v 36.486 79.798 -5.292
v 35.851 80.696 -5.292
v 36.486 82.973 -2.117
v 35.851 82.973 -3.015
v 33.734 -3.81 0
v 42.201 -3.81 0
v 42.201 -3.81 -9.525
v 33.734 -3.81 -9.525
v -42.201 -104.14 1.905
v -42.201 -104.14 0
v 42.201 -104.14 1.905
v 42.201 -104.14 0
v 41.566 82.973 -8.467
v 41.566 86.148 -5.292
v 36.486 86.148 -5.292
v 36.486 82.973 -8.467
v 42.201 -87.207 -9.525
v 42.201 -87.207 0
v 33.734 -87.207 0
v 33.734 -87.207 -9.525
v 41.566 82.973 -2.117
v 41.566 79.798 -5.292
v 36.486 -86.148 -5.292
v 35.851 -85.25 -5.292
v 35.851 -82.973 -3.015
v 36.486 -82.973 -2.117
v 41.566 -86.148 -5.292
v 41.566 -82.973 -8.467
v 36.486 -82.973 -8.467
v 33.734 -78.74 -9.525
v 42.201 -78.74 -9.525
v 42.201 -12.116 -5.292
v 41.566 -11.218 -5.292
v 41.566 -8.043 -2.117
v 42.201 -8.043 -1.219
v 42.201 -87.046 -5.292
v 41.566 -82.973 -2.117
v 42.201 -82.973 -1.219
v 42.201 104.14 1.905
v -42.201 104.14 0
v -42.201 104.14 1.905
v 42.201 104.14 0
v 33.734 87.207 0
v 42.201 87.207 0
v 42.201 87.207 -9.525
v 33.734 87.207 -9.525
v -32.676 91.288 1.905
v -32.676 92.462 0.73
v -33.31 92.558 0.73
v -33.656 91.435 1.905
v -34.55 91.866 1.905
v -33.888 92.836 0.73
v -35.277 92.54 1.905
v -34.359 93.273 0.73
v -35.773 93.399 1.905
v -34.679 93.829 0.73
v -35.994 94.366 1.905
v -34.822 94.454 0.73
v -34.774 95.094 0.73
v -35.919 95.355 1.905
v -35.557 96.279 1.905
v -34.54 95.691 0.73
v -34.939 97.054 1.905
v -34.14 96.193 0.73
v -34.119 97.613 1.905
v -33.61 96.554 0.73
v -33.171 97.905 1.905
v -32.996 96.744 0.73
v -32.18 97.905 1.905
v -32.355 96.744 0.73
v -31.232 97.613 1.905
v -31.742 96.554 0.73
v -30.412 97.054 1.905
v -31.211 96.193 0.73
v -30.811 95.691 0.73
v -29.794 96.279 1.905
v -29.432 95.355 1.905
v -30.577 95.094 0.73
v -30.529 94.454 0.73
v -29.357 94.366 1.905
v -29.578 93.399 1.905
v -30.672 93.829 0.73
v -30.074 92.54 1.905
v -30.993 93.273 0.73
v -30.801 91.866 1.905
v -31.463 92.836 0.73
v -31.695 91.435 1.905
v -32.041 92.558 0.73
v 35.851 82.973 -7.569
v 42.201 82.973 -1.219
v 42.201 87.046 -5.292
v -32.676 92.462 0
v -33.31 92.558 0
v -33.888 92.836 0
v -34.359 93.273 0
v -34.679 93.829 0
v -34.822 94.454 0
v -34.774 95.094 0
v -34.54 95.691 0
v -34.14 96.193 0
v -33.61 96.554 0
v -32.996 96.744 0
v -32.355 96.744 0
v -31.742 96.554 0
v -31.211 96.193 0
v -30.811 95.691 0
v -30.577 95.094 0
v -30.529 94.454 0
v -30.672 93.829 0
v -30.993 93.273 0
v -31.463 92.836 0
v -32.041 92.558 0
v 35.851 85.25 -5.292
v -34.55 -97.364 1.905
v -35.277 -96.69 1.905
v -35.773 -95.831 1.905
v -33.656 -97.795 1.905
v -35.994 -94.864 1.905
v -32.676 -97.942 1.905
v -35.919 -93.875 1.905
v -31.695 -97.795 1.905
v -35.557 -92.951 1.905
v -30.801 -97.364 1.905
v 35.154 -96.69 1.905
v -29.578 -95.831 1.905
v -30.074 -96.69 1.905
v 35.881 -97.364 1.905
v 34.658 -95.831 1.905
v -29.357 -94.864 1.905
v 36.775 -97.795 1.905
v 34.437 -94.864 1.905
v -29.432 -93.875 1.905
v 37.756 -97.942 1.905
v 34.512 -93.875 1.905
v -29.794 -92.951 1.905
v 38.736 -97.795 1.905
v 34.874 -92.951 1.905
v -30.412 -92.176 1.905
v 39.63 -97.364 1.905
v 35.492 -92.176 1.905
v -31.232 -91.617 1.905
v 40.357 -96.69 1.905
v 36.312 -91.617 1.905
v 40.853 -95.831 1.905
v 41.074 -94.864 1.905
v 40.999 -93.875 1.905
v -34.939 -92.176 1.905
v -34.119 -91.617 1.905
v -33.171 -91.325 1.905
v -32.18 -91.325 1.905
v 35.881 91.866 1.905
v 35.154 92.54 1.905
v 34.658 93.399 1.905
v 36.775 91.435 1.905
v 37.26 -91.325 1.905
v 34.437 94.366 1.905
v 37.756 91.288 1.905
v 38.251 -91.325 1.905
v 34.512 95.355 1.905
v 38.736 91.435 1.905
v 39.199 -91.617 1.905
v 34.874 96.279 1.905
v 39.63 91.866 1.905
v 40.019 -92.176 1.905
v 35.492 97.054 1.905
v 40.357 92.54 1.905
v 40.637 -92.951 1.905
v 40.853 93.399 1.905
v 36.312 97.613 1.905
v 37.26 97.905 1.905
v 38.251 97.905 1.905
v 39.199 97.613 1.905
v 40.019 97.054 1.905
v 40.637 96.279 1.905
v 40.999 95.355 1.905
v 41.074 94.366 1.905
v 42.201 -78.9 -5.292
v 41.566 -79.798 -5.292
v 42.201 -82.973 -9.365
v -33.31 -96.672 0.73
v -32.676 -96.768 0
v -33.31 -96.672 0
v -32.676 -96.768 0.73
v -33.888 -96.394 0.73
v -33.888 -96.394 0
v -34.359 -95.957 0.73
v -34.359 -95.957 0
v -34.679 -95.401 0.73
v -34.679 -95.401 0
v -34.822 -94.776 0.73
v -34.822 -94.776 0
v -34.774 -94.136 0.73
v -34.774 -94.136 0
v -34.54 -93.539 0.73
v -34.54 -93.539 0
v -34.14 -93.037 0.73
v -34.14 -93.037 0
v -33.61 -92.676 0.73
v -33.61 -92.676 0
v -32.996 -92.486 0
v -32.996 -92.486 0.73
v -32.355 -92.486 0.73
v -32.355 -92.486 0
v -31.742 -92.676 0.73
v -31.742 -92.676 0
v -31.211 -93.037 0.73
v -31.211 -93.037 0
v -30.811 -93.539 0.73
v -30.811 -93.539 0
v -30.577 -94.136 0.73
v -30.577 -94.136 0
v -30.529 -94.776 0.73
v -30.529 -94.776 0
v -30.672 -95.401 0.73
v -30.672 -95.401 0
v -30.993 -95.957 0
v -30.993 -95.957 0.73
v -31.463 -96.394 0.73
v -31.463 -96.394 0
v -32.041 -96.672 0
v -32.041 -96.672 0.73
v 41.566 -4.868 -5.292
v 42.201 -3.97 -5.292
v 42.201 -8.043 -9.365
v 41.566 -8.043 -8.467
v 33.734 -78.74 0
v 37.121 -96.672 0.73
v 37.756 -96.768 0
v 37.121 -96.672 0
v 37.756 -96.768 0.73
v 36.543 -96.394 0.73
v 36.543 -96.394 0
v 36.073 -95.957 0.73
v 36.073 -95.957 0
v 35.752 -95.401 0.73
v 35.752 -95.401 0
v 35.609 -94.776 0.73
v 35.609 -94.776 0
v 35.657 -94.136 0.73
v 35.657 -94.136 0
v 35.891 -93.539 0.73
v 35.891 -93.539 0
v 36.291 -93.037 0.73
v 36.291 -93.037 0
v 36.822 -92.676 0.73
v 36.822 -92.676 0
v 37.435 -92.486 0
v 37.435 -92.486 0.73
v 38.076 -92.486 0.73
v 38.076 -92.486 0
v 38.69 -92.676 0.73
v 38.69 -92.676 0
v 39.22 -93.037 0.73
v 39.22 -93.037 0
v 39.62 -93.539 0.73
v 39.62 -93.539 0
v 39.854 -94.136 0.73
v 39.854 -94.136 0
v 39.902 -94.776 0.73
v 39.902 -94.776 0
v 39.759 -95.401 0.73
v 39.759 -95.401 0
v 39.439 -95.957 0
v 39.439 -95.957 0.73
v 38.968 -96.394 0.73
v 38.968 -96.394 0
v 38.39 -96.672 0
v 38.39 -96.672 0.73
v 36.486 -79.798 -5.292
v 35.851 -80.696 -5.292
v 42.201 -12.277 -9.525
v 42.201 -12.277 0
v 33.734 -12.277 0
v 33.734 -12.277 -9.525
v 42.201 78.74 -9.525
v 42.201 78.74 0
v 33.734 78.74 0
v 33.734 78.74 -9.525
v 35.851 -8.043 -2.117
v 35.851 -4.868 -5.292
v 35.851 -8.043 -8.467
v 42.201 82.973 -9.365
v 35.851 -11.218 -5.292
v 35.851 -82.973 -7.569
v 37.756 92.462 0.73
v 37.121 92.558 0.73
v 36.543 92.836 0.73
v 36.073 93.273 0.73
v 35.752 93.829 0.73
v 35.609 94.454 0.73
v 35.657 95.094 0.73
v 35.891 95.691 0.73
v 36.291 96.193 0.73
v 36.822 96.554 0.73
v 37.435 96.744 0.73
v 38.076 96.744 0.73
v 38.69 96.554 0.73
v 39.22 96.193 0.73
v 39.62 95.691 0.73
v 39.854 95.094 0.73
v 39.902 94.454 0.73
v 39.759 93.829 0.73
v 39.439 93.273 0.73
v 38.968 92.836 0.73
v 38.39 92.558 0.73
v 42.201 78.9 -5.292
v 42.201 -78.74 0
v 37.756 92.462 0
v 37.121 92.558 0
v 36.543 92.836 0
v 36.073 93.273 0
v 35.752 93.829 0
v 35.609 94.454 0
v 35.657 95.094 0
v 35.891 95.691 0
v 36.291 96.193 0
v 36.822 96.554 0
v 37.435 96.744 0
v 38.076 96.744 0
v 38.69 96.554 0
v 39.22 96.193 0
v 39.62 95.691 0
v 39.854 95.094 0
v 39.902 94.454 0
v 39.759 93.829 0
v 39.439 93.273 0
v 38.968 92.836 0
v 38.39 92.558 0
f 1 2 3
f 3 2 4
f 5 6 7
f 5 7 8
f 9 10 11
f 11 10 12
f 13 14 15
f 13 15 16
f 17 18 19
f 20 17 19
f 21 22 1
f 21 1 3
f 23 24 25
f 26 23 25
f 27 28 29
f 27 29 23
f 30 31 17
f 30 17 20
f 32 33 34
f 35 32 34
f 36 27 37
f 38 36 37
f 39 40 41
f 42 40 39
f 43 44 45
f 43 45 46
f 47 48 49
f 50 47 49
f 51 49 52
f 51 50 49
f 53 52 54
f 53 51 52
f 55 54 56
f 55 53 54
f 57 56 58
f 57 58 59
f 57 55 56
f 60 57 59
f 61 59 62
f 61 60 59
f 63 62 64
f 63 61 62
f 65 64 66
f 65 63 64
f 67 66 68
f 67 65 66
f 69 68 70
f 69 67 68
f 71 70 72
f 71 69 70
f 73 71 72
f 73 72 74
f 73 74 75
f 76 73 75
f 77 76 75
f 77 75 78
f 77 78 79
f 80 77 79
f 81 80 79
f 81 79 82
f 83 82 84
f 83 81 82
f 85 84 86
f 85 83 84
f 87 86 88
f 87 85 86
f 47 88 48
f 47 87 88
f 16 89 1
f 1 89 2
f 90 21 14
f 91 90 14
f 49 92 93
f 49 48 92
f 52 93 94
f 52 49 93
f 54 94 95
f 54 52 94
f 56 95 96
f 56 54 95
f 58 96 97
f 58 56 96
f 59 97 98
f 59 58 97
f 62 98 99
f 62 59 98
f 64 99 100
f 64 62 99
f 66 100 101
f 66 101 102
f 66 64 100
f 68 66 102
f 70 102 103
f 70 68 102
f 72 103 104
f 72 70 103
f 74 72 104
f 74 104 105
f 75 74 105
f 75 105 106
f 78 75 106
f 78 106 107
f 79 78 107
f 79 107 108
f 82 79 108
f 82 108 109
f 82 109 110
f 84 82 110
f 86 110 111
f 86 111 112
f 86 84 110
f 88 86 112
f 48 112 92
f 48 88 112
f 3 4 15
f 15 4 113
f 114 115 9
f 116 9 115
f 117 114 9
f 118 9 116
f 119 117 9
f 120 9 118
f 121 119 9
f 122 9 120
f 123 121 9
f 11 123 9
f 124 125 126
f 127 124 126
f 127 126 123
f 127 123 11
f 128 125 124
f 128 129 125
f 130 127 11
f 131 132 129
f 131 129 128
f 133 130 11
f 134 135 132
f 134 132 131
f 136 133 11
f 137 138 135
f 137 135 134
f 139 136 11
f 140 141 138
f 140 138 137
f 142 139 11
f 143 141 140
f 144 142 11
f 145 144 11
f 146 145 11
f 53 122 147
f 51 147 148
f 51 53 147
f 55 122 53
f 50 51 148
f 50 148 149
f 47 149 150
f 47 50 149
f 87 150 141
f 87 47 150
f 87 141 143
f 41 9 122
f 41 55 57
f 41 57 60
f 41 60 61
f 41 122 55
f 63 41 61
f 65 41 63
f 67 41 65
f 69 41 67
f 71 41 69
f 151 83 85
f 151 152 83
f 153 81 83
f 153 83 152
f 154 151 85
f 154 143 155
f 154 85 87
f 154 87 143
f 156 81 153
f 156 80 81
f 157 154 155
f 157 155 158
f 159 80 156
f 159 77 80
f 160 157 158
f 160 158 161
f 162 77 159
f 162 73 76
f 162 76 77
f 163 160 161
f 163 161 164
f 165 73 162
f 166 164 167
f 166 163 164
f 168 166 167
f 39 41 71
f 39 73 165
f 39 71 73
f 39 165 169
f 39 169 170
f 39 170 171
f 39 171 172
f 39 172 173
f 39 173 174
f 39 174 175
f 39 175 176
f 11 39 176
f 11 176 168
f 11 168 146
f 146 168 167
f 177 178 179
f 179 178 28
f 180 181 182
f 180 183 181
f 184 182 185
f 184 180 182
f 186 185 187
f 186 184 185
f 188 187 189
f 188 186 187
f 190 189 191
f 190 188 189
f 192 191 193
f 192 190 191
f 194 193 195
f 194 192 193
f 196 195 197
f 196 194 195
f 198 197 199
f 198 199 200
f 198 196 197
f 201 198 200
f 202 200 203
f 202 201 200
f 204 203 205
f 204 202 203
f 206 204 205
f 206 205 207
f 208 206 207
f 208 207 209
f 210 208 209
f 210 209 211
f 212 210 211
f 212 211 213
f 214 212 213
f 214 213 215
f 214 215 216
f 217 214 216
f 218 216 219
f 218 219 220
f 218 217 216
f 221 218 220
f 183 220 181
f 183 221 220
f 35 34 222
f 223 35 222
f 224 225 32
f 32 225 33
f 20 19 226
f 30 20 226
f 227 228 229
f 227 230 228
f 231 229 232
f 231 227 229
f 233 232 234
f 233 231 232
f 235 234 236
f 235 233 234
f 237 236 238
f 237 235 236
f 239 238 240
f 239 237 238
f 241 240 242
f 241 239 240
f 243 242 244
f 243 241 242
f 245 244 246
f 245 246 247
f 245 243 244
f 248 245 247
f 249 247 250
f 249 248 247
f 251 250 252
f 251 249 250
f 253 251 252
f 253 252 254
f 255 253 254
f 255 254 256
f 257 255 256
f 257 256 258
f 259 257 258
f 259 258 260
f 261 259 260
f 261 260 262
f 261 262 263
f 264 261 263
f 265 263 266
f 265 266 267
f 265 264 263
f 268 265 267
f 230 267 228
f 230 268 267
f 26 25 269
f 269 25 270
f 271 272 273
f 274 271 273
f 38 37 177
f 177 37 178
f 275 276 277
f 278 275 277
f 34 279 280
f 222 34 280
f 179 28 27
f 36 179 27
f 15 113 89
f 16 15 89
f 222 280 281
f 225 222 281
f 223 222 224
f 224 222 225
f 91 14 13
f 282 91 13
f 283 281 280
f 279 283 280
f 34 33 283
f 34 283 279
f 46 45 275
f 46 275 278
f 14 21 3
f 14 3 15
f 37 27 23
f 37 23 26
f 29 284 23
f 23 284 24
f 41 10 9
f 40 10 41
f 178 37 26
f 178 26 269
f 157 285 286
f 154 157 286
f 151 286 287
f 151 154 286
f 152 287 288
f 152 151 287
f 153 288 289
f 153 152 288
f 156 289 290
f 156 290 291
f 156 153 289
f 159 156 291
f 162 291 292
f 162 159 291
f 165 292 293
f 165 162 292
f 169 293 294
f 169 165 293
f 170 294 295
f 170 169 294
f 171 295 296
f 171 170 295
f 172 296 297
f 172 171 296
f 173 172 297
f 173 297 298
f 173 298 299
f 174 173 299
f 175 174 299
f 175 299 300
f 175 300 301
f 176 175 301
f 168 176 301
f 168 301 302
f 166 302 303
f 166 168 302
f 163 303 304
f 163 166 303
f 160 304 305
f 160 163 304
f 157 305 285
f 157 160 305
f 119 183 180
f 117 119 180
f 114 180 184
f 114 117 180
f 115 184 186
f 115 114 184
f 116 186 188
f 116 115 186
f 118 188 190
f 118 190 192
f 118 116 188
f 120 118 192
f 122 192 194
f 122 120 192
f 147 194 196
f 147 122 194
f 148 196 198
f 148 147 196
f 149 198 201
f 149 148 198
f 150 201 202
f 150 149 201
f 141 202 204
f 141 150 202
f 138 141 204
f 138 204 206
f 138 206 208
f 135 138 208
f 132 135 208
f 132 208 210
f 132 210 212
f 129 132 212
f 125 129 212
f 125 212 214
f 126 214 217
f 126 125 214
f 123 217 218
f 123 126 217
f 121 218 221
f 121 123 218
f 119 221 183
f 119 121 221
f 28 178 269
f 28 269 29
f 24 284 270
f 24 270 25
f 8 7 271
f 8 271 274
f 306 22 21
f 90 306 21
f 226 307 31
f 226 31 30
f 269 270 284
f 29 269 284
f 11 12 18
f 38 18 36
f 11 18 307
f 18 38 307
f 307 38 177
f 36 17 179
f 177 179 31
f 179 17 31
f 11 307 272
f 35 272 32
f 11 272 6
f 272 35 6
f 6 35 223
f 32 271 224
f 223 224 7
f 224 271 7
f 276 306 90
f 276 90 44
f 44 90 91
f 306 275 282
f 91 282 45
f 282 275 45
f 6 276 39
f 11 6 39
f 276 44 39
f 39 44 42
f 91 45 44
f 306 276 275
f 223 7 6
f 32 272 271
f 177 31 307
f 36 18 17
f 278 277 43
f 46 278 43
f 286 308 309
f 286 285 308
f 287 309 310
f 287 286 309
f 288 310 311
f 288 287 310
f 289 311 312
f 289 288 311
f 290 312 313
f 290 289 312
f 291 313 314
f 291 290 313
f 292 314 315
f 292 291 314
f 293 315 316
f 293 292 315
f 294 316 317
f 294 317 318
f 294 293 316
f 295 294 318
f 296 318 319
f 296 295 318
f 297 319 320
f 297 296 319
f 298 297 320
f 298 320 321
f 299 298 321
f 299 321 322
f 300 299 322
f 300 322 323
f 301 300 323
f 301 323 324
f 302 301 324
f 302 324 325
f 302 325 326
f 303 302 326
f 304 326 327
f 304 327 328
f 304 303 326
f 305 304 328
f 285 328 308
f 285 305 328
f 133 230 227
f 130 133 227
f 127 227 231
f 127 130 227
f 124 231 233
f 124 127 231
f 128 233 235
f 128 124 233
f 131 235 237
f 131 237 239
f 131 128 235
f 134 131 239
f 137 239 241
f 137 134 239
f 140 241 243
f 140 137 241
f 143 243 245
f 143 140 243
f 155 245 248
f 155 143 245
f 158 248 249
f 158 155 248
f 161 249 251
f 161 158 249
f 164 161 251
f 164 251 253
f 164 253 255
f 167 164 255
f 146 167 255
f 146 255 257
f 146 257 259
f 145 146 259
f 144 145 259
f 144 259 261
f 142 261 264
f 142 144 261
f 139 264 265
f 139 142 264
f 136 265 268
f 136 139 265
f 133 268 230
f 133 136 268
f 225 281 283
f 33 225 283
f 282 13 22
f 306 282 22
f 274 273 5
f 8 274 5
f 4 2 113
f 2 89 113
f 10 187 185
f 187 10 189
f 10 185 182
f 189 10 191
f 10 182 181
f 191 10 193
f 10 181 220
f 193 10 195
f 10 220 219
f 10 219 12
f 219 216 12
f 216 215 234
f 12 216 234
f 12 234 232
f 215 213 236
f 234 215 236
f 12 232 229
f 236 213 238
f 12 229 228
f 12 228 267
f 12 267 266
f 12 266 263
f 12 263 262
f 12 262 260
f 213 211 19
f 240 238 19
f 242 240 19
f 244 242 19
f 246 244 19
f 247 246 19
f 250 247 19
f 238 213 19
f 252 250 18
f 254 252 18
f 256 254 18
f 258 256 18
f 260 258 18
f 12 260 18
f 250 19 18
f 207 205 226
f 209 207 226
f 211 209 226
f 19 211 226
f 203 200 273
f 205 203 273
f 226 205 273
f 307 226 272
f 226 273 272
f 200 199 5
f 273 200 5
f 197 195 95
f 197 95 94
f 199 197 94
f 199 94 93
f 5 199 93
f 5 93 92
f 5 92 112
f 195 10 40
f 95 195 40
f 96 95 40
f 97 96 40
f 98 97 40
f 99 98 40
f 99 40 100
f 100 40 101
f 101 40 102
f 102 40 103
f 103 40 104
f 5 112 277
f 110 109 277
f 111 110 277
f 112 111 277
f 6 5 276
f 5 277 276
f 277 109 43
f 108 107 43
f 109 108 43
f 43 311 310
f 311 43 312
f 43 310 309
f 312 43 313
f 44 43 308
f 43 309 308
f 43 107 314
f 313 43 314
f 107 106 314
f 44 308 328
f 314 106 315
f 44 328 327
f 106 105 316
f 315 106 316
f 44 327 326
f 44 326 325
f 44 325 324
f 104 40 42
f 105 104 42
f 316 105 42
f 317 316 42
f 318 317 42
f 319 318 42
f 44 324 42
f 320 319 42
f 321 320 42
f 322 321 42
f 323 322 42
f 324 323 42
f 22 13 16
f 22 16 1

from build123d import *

# Parameters (mm, degrees)
SKETCH1_W                      = 84.401025
SKETCH1_H                      = 208.28
BOSS_EXTRUDE1_DEPTH            = 1.905
F_6_CLEARANCE_HOLE1_AT_2_COUNT = 2
F_6_CLEARANCE_HOLE1_AT_2_PITCH = 189.23
F_6_CLEARANCE_HOLE1_AT_3_COUNT = 2
F_6_CLEARANCE_HOLE1_AT_3_PITCH = 201.912164523
F_6_CLEARANCE_HOLE1_AT_4_COUNT = 2
F_6_CLEARANCE_HOLE1_AT_4_PITCH = 70.431025
SKETCH4_W                      = 8.466667
SKETCH4_H                      = 8.466667
BOSS_EXTRUDE2_DEPTH            = 9.525
CUT_EXTRUDE3_DEPTH             = 6.35
CHAMFER1_SIZE                  = 0.635


with BuildPart() as part:
    # Sketch1 → Boss-Extrude1 (new body)
    with BuildSketch(Plane.XY):
        Rectangle(SKETCH1_W, SKETCH1_H)
    extrude(amount=BOSS_EXTRUDE1_DEPTH)

    # Sketch3 → #6 Clearance Hole1 (revolve, cut)
    with BuildSketch(Plane(origin=(-32.6755125, 94.615, 1.905), x_dir=(0, -1, 0), z_dir=(1, 0, 0))):
        Polygon((0, 0), (0, 1.905), (2.15265, 1.905), (2.15265, 1.17475), (3.3274, 0), align=None)
    f_6_clearance_hole1 = revolve(axis=Axis((-32.6755125, 94.615, 8.255), (0, 0, -1)), mode=Mode.SUBTRACT)

    # #6 Clearance Hole1 at 2: #6 Clearance Hole1 ×2
    with Locations(*[(0, -i * F_6_CLEARANCE_HOLE1_AT_2_PITCH, 0) for i in range(1, F_6_CLEARANCE_HOLE1_AT_2_COUNT)]):
        add(f_6_clearance_hole1, mode=Mode.SUBTRACT)

    # #6 Clearance Hole1 at 3: #6 Clearance Hole1 ×2
    with Locations(*[Vector(0.34882011772903904, -0.9371896955619494, 0) * (i * F_6_CLEARANCE_HOLE1_AT_3_PITCH) for i in range(1, F_6_CLEARANCE_HOLE1_AT_3_COUNT)]):
        add(f_6_clearance_hole1, mode=Mode.SUBTRACT)

    # #6 Clearance Hole1 at 4: #6 Clearance Hole1 ×2
    with Locations(*[(i * F_6_CLEARANCE_HOLE1_AT_4_PITCH, 0, 0) for i in range(1, F_6_CLEARANCE_HOLE1_AT_4_COUNT)]):
        add(f_6_clearance_hole1, mode=Mode.SUBTRACT)

    # Sketch4 → Boss-Extrude2 (add)
    with BuildSketch(Plane(origin=(0, 0, 0), x_dir=(-1, 0, 0), z_dir=(0, 0, -1))):
        with Locations((-37.967179, 82.973333082)):
            Rectangle(SKETCH4_W, SKETCH4_H)
        with Locations((-37.967179, -8.0433335)):
            Rectangle(SKETCH4_W, SKETCH4_H)
        with Locations((-37.967179, -82.973333082)):
            Rectangle(SKETCH4_W, SKETCH4_H)
    extrude(amount=BOSS_EXTRUDE2_DEPTH)

    # Sketch5 → Cut-Extrude3 (cut)
    with BuildSketch(Plane(origin=(42.2005125, 0, 0), x_dir=(0, 0, -1), z_dir=(1, 0, 0))):
        Polygon((2.116666667, -82.973333082), (5.291666667, -79.798333082), (8.466666667, -82.973333082), (5.291666667, -86.148333082), align=None)
        Polygon((2.116666667, -8.0433335), (5.291666667, -4.8683335), (8.466666667, -8.0433335), (5.291666667, -11.2183335), align=None)
        Polygon((2.116666667, 82.973333082), (5.291666667, 86.148333082), (8.466666667, 82.973333082), (5.291666667, 79.798333082), align=None)
    extrude(amount=-CUT_EXTRUDE3_DEPTH, mode=Mode.SUBTRACT)

    # Chamfer1
    chamfer1_edges = [part.edges().sort_by_distance(p)[0] for p in [
        (35.8505125, 81.385833082, -3.704166667),
        (35.8505125, 84.560833082, -3.704166667),
        (35.8505125, 84.560833082, -6.879166667),
        (35.8505125, 81.385833082, -6.879166667),
        (42.2005125, 81.385833082, -3.704166667),
        (42.2005125, 81.385833082, -6.879166667),
        (42.2005125, 84.560833082, -6.879166667),
        (42.2005125, 84.560833082, -3.704166667),
        (35.8505125, -84.560833082, -3.704166667),
        (35.8505125, -81.385833082, -3.704166667),
        (35.8505125, -81.385833082, -6.879166667),
        (35.8505125, -84.560833082, -6.879166667),
        (42.2005125, -84.560833082, -3.704166667),
        (42.2005125, -84.560833082, -6.879166667),
        (42.2005125, -81.385833082, -6.879166667),
        (42.2005125, -81.385833082, -3.704166667),
        (42.2005125, -9.6308335, -3.704166667),
        (42.2005125, -9.6308335, -6.879166667),
        (42.2005125, -6.4558335, -6.879166667),
        (42.2005125, -6.4558335, -3.704166667),
    ]]
    chamfer(chamfer1_edges, length=CHAMFER1_SIZE)


solid = part.part
